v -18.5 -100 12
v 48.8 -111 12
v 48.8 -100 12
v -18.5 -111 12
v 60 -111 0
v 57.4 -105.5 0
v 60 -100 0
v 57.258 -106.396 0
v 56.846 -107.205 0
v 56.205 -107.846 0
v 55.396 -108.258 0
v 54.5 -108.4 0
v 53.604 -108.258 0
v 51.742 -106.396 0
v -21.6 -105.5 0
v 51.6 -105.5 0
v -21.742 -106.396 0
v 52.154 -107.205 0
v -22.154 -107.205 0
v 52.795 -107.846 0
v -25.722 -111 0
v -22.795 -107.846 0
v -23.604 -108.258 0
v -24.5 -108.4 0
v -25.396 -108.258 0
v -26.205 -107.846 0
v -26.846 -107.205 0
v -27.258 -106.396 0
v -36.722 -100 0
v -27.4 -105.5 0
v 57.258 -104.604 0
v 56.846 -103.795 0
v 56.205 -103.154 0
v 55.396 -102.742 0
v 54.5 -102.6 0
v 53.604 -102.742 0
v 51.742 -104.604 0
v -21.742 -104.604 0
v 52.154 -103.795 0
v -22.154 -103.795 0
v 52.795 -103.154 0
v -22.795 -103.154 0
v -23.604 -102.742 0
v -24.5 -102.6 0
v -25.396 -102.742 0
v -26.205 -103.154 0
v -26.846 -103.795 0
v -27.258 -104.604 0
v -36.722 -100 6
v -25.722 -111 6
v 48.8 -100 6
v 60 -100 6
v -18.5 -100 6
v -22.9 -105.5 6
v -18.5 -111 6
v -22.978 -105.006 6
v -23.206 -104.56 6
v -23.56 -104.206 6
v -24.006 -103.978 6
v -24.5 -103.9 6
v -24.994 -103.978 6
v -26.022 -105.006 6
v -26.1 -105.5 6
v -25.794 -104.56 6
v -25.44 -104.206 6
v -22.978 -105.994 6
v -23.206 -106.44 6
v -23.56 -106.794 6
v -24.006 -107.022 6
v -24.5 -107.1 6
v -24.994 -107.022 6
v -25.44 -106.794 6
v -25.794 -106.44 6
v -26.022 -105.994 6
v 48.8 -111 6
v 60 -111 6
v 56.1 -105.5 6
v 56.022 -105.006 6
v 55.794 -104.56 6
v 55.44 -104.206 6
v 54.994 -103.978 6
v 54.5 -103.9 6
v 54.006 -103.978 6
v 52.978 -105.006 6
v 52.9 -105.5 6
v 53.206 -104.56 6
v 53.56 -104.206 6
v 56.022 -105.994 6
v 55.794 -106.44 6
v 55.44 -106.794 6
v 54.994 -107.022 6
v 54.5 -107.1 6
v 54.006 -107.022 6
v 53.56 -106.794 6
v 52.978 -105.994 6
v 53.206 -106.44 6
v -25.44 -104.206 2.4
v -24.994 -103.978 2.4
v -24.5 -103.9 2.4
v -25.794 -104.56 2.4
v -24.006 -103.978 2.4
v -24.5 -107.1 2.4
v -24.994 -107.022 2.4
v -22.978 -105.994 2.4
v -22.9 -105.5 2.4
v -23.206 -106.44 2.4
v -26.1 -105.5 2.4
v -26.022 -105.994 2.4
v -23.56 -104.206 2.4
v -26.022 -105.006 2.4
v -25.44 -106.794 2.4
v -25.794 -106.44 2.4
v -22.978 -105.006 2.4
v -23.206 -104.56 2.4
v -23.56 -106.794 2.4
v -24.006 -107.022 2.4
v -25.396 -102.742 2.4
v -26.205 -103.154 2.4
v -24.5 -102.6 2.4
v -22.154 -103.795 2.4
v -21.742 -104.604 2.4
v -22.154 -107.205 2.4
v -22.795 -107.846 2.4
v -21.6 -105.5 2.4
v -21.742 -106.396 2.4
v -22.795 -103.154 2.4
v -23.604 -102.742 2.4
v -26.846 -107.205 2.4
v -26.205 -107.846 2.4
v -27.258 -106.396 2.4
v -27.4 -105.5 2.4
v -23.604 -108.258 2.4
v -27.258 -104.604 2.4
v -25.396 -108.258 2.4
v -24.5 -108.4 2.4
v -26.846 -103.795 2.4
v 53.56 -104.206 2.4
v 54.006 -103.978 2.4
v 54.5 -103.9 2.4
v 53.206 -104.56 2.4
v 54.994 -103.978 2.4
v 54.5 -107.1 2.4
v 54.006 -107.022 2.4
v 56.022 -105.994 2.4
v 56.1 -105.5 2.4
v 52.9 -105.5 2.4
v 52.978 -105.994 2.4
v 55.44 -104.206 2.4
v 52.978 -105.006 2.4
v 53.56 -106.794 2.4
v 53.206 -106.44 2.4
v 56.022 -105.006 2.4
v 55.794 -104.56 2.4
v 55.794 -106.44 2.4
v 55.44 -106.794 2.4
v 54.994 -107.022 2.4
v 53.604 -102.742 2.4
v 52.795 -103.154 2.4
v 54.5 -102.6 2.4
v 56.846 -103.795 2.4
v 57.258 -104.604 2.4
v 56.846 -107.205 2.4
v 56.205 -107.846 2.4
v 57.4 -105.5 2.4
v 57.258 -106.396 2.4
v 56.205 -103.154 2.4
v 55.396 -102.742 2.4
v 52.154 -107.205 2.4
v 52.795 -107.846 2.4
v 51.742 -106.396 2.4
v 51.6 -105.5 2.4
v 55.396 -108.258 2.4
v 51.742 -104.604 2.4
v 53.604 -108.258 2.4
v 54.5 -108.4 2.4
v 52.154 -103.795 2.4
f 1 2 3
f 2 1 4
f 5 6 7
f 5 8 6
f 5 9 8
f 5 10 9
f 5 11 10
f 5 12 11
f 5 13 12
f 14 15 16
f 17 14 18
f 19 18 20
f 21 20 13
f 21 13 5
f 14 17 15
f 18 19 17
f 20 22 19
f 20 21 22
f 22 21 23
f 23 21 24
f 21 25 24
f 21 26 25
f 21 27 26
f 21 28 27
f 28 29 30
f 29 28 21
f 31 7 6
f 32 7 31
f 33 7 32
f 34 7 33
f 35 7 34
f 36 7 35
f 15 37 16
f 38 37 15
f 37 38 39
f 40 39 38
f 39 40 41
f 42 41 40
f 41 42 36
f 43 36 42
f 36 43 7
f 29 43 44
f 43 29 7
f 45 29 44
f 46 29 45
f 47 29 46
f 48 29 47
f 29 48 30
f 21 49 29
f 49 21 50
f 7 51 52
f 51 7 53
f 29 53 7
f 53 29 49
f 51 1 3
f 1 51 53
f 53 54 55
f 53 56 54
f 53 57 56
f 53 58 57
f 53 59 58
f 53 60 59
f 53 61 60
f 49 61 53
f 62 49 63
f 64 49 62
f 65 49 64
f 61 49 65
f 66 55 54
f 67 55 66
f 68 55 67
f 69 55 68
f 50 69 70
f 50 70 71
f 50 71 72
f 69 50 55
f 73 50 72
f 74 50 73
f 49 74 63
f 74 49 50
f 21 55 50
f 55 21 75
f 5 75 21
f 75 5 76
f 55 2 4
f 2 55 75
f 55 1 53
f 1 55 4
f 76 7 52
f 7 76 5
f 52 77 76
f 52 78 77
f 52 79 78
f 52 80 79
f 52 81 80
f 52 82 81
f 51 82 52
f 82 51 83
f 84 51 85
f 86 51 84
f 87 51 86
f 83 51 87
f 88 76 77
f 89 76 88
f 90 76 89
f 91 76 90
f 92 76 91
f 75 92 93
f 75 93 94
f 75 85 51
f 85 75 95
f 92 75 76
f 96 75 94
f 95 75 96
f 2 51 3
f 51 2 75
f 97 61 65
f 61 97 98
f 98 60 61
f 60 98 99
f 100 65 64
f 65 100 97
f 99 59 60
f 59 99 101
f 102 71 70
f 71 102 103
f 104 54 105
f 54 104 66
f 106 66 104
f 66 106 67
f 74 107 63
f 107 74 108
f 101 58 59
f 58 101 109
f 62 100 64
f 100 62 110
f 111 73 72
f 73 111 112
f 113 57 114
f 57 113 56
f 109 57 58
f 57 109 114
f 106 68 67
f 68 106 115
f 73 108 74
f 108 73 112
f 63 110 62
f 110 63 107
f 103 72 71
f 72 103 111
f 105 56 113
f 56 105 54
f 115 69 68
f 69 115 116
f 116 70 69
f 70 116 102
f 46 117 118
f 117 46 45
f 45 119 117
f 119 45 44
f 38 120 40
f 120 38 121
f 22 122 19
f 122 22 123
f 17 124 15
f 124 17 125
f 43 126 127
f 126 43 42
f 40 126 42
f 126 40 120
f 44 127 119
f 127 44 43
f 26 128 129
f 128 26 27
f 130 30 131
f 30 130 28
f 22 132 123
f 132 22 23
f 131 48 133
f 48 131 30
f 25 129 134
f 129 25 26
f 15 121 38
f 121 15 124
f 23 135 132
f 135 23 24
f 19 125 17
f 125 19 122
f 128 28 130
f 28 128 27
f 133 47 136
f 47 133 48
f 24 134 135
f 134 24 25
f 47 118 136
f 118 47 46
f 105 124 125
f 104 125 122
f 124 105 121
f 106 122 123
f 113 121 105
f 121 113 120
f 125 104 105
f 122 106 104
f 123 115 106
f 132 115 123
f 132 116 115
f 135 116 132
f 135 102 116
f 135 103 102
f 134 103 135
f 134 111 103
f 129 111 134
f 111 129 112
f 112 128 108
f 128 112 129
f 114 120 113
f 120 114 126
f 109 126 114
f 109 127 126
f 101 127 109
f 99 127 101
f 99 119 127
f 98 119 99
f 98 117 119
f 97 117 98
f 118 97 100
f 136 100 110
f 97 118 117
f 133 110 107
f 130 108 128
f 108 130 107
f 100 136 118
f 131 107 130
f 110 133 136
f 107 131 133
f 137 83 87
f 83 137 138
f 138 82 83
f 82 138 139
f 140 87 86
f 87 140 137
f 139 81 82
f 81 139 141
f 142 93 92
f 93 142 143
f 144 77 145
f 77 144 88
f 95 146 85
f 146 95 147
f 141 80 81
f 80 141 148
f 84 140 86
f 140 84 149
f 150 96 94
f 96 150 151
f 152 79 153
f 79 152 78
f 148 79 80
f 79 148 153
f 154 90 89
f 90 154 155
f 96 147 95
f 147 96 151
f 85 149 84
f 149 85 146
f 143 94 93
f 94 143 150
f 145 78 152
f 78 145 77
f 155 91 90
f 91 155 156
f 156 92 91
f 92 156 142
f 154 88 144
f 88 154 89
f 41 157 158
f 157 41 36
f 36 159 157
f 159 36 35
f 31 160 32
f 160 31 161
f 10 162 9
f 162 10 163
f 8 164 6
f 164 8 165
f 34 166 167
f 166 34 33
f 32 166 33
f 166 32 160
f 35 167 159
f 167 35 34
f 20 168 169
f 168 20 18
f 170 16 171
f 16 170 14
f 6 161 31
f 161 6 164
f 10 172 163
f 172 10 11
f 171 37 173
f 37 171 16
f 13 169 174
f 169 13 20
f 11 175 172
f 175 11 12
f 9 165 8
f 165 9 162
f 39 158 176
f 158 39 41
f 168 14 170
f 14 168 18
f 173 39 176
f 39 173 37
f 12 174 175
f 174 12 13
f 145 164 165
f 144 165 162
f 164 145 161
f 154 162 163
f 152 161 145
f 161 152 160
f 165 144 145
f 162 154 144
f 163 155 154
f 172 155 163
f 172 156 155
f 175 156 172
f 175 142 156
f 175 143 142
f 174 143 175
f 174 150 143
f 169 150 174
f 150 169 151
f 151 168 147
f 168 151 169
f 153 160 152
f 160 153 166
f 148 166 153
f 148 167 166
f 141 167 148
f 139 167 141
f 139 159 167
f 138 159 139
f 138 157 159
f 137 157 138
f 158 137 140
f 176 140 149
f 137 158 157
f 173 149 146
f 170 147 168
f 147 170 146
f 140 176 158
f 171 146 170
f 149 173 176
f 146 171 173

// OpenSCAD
use <bed_carriage.scad>

height = 12;
translate([60,-205, height]) mirror([0,1,0]) rotate([0,180,90]) edge_arm();
